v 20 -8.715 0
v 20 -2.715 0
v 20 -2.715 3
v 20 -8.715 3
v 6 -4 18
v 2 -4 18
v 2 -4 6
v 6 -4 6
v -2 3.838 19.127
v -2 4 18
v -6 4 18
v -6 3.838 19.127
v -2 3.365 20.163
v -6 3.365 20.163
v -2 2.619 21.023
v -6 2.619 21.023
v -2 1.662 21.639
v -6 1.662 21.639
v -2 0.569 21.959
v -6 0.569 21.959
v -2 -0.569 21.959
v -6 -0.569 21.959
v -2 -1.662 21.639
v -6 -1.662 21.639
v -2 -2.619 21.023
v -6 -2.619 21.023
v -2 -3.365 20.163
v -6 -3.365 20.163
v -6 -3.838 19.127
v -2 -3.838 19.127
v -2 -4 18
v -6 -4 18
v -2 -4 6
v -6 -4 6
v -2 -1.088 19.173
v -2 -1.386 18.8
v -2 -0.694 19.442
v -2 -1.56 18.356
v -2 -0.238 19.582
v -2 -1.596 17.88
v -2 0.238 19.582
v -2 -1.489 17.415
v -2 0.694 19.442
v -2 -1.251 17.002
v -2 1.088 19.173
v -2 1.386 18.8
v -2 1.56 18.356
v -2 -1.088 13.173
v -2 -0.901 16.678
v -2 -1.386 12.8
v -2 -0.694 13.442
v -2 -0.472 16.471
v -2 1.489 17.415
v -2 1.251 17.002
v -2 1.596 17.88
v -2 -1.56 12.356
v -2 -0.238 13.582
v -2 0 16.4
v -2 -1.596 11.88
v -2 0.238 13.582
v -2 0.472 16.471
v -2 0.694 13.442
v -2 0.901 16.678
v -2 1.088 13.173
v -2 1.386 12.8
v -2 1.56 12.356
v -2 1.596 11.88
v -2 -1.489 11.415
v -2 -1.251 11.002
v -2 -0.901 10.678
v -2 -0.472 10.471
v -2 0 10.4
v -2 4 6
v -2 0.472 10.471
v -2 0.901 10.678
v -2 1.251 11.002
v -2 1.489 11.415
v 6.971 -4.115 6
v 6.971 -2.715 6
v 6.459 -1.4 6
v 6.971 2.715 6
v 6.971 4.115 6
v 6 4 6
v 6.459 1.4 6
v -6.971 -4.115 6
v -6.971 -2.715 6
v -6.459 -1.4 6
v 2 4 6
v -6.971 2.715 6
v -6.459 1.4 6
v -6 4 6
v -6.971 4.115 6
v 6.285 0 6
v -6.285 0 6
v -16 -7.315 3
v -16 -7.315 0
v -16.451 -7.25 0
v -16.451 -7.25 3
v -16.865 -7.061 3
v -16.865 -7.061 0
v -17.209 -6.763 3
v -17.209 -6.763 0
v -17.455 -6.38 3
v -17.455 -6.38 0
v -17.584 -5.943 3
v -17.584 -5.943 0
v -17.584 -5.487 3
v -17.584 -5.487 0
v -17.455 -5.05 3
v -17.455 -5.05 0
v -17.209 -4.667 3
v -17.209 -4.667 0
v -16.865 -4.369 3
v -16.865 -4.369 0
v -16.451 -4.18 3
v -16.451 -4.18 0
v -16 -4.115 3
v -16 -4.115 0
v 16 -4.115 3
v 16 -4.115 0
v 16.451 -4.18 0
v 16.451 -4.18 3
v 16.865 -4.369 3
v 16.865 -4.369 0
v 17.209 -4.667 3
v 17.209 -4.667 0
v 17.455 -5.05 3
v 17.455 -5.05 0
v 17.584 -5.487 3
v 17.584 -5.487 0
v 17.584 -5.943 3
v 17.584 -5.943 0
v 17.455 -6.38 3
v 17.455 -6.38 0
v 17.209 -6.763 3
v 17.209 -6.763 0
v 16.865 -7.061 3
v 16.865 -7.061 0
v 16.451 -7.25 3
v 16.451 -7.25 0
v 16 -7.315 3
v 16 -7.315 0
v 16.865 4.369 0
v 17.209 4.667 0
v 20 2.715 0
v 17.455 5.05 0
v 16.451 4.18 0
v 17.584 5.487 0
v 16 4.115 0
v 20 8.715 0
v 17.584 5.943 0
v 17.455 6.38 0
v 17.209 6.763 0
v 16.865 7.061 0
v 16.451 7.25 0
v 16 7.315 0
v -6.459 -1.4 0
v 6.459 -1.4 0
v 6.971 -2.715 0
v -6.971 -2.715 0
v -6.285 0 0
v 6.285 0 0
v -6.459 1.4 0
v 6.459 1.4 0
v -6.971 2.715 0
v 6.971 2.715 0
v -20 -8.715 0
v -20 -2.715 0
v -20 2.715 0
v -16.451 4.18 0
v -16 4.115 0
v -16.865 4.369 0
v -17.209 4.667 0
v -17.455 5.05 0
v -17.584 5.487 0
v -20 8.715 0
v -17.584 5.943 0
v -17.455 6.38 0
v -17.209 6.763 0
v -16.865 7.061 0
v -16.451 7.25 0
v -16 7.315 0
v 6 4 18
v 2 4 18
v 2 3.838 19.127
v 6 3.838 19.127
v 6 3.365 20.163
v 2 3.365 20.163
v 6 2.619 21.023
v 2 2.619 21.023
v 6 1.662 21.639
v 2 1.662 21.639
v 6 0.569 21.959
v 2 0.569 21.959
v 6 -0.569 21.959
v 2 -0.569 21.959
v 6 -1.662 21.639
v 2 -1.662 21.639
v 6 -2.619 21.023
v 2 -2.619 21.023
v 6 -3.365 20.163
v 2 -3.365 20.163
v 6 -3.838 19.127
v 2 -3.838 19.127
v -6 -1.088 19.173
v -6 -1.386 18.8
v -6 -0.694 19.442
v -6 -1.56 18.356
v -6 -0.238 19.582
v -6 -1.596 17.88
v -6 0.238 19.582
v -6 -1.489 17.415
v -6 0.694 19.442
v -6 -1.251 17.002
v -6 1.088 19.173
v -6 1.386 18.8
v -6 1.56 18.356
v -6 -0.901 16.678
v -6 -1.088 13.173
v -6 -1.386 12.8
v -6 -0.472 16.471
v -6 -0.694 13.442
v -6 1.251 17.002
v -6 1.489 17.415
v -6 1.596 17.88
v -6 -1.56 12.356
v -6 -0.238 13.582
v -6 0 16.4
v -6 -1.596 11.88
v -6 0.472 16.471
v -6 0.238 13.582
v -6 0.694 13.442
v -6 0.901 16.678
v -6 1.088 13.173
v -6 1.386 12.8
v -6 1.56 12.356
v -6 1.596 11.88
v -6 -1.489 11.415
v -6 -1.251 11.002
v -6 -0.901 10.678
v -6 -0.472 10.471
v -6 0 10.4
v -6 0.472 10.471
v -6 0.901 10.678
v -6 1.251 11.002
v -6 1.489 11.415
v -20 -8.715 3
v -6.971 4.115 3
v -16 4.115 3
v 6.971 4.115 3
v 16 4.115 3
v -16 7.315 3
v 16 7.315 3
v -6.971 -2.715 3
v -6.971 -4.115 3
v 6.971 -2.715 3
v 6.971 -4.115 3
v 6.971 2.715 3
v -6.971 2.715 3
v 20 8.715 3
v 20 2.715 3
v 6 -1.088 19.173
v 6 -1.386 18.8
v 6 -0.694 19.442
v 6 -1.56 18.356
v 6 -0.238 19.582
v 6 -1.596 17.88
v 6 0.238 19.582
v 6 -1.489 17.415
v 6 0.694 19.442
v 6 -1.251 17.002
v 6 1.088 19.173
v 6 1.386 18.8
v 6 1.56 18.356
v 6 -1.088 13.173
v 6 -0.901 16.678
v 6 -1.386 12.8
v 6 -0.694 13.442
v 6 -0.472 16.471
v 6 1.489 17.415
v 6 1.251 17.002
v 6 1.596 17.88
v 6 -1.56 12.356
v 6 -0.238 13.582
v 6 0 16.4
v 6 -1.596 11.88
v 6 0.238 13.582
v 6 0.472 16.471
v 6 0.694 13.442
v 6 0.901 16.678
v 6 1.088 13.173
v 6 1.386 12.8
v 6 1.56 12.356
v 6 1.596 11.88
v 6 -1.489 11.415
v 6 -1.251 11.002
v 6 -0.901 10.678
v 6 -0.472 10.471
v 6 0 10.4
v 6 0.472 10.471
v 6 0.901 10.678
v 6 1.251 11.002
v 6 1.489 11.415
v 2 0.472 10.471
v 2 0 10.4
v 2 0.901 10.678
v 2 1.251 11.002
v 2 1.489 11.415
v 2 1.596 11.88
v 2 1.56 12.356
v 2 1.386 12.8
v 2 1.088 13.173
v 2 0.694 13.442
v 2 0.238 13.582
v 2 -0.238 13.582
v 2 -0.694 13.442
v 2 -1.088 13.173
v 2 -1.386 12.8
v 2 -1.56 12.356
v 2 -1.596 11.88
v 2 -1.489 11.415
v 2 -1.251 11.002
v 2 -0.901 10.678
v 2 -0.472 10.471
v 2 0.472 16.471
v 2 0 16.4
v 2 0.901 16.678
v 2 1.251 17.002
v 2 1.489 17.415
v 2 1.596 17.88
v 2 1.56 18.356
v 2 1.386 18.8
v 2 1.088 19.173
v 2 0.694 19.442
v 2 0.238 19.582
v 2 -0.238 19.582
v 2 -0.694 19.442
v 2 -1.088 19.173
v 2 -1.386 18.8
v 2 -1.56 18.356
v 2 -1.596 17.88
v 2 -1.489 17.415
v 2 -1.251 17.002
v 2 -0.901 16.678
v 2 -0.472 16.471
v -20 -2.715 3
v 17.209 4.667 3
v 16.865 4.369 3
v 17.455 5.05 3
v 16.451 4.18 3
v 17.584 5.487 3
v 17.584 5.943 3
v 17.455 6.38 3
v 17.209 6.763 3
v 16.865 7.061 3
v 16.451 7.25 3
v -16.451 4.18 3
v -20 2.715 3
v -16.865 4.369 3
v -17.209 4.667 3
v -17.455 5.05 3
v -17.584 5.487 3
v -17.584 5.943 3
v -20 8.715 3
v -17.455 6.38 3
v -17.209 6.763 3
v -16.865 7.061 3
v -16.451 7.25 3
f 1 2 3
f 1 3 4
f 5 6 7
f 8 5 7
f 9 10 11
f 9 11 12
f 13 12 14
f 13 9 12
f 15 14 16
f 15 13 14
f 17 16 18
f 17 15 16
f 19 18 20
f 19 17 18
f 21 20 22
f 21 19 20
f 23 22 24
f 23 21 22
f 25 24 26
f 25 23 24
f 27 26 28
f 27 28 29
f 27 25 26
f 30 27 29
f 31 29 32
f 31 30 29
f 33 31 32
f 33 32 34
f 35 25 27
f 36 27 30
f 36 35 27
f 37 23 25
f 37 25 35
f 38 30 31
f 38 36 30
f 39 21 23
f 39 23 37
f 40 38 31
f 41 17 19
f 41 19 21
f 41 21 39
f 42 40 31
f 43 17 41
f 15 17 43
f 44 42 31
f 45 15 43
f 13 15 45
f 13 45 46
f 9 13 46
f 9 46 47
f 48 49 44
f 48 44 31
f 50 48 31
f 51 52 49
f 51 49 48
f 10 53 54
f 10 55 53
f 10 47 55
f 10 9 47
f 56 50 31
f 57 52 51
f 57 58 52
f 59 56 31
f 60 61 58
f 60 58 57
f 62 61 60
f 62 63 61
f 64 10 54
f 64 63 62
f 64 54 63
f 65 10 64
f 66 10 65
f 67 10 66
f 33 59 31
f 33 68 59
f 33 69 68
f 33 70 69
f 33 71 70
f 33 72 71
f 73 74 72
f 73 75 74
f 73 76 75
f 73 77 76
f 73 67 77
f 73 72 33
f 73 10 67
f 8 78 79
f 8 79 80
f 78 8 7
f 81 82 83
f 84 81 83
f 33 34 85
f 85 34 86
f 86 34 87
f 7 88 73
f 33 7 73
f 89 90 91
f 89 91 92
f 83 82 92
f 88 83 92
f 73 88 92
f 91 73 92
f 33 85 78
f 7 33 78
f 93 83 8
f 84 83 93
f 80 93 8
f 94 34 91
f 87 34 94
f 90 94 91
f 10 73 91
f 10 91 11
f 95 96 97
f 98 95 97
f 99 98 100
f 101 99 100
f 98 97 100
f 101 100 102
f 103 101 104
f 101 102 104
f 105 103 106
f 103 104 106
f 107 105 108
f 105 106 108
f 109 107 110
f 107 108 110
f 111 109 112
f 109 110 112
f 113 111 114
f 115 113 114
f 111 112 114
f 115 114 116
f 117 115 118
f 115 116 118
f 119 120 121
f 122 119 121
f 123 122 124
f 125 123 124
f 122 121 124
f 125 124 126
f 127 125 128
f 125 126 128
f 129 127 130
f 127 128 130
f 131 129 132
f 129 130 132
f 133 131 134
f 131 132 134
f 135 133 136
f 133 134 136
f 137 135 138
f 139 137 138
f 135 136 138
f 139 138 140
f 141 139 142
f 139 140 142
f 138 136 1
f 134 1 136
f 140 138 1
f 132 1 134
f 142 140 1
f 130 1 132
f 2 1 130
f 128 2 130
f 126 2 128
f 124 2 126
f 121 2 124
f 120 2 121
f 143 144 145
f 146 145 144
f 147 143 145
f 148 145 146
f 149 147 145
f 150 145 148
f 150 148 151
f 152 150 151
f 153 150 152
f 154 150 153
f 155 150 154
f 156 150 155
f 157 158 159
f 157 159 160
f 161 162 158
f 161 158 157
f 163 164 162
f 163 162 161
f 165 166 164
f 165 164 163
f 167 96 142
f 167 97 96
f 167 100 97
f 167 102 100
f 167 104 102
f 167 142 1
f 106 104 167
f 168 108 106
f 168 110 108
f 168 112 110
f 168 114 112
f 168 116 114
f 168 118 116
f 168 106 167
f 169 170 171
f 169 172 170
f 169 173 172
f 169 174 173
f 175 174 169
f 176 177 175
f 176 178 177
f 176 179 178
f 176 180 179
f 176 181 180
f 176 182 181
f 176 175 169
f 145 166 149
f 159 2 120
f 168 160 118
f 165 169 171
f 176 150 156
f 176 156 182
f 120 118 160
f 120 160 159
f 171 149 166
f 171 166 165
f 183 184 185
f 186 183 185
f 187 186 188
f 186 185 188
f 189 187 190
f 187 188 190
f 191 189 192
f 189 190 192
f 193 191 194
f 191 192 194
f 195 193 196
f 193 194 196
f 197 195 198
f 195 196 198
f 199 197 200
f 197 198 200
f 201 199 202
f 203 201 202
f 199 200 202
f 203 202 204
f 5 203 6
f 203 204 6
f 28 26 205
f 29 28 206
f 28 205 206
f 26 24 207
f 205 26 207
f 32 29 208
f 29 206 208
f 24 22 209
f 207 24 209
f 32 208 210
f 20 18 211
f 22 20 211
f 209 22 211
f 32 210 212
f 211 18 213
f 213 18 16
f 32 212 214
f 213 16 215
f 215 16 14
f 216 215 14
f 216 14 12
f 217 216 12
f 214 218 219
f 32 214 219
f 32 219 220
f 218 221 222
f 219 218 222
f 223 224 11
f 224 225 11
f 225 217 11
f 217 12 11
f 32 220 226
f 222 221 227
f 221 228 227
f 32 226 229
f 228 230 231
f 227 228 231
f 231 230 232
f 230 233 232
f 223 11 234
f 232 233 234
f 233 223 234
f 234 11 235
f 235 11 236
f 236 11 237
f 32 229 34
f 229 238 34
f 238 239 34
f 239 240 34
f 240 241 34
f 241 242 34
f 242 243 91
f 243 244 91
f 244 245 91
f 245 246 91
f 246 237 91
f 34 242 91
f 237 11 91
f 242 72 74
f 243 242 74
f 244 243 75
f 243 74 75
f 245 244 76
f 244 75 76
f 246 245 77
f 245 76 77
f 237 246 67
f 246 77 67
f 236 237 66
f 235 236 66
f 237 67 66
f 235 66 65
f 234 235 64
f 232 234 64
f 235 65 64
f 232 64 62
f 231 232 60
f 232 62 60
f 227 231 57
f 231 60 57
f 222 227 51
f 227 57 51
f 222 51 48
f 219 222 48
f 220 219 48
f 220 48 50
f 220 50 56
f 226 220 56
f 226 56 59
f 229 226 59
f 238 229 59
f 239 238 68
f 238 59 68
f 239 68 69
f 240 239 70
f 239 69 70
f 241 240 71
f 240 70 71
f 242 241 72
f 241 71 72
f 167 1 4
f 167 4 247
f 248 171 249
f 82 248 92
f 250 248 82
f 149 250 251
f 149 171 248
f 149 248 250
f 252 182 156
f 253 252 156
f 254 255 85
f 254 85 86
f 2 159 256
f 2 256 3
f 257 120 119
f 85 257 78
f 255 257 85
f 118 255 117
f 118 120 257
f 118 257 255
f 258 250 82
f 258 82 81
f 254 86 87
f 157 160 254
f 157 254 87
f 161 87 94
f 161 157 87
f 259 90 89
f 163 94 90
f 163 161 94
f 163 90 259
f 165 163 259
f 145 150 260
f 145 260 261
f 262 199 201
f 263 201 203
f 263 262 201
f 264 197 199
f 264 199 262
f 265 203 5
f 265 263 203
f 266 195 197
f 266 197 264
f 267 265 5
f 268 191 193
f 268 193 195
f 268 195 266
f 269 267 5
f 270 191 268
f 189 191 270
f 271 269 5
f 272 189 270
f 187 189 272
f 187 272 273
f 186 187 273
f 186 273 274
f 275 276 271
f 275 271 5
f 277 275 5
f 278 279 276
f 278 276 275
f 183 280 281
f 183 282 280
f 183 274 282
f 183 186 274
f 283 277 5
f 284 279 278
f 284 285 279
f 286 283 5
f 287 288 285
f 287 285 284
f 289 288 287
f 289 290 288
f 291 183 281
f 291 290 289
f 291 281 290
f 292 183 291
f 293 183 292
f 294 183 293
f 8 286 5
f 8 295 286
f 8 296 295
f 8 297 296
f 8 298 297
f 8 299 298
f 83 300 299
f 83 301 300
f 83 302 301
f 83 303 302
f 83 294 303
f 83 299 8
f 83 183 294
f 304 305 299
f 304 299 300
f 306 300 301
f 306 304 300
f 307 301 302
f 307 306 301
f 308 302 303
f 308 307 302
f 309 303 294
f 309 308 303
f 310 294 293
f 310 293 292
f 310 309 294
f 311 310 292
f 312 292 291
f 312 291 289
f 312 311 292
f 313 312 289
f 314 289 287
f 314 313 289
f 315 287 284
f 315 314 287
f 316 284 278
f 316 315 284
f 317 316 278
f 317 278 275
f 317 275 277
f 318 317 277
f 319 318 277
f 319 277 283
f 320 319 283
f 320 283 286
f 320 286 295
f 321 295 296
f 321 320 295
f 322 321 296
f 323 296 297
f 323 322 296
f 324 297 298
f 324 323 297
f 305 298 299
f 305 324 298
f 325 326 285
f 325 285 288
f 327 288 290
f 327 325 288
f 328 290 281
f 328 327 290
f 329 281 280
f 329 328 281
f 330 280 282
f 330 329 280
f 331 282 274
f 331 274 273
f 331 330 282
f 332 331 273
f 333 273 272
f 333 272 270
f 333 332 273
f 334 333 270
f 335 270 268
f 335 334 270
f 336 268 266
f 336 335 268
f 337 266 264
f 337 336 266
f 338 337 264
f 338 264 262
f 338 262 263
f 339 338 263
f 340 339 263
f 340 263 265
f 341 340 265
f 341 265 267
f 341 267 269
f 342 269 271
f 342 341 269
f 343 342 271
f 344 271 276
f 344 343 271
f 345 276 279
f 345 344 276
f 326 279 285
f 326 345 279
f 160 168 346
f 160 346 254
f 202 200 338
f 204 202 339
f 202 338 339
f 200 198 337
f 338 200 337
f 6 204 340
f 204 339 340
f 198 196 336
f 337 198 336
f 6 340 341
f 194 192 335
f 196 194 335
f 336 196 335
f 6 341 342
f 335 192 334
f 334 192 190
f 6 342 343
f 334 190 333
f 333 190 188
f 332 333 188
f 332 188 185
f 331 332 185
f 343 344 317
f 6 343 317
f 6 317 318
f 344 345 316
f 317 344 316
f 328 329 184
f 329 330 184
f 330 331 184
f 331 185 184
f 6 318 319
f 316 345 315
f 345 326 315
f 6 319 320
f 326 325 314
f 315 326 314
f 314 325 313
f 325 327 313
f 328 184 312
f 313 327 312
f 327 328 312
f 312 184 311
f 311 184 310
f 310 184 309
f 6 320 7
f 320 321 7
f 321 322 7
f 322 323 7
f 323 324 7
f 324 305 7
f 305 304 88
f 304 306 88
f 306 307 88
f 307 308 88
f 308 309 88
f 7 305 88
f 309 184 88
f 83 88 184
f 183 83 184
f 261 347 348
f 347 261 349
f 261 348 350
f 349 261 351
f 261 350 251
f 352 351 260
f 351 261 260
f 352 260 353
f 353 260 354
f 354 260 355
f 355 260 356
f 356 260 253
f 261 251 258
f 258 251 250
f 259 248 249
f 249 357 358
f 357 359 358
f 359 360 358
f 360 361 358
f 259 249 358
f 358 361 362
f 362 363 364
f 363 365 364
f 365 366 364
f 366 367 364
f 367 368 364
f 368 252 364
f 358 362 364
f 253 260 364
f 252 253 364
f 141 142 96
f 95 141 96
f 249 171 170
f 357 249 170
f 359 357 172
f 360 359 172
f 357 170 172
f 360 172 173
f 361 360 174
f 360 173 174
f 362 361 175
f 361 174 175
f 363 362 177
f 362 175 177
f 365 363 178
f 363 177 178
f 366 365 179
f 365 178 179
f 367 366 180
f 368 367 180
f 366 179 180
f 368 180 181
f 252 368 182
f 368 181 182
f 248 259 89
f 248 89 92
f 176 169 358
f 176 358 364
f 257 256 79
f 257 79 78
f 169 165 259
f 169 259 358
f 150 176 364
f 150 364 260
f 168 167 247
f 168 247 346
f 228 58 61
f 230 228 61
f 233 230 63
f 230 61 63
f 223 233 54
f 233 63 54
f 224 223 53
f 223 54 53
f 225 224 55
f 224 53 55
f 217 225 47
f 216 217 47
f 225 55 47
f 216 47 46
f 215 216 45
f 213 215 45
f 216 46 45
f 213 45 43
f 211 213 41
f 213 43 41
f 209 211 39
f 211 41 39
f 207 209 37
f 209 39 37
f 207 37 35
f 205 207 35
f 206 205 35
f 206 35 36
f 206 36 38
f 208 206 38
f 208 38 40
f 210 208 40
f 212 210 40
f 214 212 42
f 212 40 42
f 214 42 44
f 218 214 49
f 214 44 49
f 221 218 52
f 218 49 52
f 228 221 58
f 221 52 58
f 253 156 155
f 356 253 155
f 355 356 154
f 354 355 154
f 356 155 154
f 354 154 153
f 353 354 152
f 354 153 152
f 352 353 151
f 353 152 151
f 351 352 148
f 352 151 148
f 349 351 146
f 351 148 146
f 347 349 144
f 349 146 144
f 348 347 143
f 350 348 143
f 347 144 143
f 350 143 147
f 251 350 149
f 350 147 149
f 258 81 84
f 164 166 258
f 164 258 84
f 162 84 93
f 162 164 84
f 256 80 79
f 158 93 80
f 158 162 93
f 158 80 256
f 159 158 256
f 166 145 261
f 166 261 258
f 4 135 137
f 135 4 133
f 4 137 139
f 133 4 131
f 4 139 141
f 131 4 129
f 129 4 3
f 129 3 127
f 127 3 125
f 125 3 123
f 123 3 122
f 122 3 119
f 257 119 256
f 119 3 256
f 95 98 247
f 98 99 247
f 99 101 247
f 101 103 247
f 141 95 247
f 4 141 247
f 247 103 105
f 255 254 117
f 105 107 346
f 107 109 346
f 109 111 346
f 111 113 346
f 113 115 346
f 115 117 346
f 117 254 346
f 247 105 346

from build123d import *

# Parameters (mm, degrees)
EXTRUDE_1_DEPTH = 3
EXTRUDE_2_DEPTH = 3
EXTRUDE_START   = 2
SKETCH_3_R      = 1.6
EXTRUDE_3_DEPTH = 4


with BuildPart() as part:
    # 草图1 → 凸台-拉伸1 (new body)
    with BuildSketch(Plane.XY):
        with BuildLine():
            Line((20, 8.715), (20, 2.715))
            Line((20, 2.715), (6.971083616, 2.715))
            ThreePointArc((6.971083616, 2.715), (6.285, 0), (6.971083616, -2.715))
            Line((6.971083616, -2.715), (20, -2.715))
            Line((20, -2.715), (20, -8.715))
            Line((20, -8.715), (-20, -8.715))
            Line((-20, -8.715), (-20, -2.715))
            Line((-20, -2.715), (-6.971083616, -2.715))
            ThreePointArc((-6.971083616, -2.715), (-6.285, 0), (-6.971083616, 2.715))
            Line((-6.971083616, 2.715), (-20, 2.715))
            Line((-20, 2.715), (-20, 8.715))
            Line((-20, 8.715), (20, 8.715))
        make_face()
        with BuildLine():
            Line((16, 4.115), (-16, 4.115))
            ThreePointArc((-16, 4.115), (-17.6, 5.715), (-16, 7.315))
            Line((-16, 7.315), (16, 7.315))
            ThreePointArc((16, 7.315), (17.6, 5.715), (16, 4.115))
        make_face(mode=Mode.SUBTRACT)
        with BuildLine():
            Line((16, -7.315), (-16, -7.315))
            ThreePointArc((-16, -7.315), (-17.6, -5.715), (-16, -4.115))
            Line((-16, -4.115), (16, -4.115))
            ThreePointArc((16, -4.115), (17.6, -5.715), (16, -7.315))
        make_face(mode=Mode.SUBTRACT)
    extrude(amount=EXTRUDE_1_DEPTH)

    # 草图2 → 凸台-拉伸2 (add)
    with BuildSketch(Plane.XY.offset(3)):
        with BuildLine():
            Line((-6.971083616, 2.715), (-6.971083616, 4.115))
            Line((-6.971083616, 4.115), (6.971083616, 4.115))
            Line((6.971083616, 4.115), (6.971083616, 2.715))
            ThreePointArc((6.971083616, 2.715), (6.285, 0), (6.971083616, -2.715))
            Line((6.971083616, -2.715), (6.971083616, -4.115))
            Line((6.971083616, -4.115), (-6.971083616, -4.115))
            Line((-6.971083616, -4.115), (-6.971083616, -2.715))
            ThreePointArc((-6.971083616, -2.715), (-6.285, 0), (-6.971083616, 2.715))
        make_face()
    extrude(amount=EXTRUDE_2_DEPTH)

    # 草图3 → 凸台-拉伸3 (add)
    with BuildSketch(Plane(origin=(0, 0, 0), x_dir=(0, 0, -1), z_dir=(1, 0, 0)).offset(EXTRUDE_START)):
        with BuildLine():
            Line((-6, 4), (-18, 4))
            ThreePointArc((-18, 4), (-22, 0), (-18, -4))
            Line((-18, -4), (-6, -4))
            Line((-6, -4), (-6, 4))
        make_face()
        with Locations((-18, 0)):
            Circle(SKETCH_3_R, mode=Mode.SUBTRACT)
        with Locations((-12, 0)):
            Circle(SKETCH_3_R, mode=Mode.SUBTRACT)
    extrude_3 = extrude(amount=EXTRUDE_3_DEPTH)

    # 镜向1: 凸台-拉伸3 across plane
    add(extrude_3.mirror(Plane(origin=(0, 0, 0), x_dir=(0, 0, 1), z_dir=(1, 0, 0))))


solid = part.part
